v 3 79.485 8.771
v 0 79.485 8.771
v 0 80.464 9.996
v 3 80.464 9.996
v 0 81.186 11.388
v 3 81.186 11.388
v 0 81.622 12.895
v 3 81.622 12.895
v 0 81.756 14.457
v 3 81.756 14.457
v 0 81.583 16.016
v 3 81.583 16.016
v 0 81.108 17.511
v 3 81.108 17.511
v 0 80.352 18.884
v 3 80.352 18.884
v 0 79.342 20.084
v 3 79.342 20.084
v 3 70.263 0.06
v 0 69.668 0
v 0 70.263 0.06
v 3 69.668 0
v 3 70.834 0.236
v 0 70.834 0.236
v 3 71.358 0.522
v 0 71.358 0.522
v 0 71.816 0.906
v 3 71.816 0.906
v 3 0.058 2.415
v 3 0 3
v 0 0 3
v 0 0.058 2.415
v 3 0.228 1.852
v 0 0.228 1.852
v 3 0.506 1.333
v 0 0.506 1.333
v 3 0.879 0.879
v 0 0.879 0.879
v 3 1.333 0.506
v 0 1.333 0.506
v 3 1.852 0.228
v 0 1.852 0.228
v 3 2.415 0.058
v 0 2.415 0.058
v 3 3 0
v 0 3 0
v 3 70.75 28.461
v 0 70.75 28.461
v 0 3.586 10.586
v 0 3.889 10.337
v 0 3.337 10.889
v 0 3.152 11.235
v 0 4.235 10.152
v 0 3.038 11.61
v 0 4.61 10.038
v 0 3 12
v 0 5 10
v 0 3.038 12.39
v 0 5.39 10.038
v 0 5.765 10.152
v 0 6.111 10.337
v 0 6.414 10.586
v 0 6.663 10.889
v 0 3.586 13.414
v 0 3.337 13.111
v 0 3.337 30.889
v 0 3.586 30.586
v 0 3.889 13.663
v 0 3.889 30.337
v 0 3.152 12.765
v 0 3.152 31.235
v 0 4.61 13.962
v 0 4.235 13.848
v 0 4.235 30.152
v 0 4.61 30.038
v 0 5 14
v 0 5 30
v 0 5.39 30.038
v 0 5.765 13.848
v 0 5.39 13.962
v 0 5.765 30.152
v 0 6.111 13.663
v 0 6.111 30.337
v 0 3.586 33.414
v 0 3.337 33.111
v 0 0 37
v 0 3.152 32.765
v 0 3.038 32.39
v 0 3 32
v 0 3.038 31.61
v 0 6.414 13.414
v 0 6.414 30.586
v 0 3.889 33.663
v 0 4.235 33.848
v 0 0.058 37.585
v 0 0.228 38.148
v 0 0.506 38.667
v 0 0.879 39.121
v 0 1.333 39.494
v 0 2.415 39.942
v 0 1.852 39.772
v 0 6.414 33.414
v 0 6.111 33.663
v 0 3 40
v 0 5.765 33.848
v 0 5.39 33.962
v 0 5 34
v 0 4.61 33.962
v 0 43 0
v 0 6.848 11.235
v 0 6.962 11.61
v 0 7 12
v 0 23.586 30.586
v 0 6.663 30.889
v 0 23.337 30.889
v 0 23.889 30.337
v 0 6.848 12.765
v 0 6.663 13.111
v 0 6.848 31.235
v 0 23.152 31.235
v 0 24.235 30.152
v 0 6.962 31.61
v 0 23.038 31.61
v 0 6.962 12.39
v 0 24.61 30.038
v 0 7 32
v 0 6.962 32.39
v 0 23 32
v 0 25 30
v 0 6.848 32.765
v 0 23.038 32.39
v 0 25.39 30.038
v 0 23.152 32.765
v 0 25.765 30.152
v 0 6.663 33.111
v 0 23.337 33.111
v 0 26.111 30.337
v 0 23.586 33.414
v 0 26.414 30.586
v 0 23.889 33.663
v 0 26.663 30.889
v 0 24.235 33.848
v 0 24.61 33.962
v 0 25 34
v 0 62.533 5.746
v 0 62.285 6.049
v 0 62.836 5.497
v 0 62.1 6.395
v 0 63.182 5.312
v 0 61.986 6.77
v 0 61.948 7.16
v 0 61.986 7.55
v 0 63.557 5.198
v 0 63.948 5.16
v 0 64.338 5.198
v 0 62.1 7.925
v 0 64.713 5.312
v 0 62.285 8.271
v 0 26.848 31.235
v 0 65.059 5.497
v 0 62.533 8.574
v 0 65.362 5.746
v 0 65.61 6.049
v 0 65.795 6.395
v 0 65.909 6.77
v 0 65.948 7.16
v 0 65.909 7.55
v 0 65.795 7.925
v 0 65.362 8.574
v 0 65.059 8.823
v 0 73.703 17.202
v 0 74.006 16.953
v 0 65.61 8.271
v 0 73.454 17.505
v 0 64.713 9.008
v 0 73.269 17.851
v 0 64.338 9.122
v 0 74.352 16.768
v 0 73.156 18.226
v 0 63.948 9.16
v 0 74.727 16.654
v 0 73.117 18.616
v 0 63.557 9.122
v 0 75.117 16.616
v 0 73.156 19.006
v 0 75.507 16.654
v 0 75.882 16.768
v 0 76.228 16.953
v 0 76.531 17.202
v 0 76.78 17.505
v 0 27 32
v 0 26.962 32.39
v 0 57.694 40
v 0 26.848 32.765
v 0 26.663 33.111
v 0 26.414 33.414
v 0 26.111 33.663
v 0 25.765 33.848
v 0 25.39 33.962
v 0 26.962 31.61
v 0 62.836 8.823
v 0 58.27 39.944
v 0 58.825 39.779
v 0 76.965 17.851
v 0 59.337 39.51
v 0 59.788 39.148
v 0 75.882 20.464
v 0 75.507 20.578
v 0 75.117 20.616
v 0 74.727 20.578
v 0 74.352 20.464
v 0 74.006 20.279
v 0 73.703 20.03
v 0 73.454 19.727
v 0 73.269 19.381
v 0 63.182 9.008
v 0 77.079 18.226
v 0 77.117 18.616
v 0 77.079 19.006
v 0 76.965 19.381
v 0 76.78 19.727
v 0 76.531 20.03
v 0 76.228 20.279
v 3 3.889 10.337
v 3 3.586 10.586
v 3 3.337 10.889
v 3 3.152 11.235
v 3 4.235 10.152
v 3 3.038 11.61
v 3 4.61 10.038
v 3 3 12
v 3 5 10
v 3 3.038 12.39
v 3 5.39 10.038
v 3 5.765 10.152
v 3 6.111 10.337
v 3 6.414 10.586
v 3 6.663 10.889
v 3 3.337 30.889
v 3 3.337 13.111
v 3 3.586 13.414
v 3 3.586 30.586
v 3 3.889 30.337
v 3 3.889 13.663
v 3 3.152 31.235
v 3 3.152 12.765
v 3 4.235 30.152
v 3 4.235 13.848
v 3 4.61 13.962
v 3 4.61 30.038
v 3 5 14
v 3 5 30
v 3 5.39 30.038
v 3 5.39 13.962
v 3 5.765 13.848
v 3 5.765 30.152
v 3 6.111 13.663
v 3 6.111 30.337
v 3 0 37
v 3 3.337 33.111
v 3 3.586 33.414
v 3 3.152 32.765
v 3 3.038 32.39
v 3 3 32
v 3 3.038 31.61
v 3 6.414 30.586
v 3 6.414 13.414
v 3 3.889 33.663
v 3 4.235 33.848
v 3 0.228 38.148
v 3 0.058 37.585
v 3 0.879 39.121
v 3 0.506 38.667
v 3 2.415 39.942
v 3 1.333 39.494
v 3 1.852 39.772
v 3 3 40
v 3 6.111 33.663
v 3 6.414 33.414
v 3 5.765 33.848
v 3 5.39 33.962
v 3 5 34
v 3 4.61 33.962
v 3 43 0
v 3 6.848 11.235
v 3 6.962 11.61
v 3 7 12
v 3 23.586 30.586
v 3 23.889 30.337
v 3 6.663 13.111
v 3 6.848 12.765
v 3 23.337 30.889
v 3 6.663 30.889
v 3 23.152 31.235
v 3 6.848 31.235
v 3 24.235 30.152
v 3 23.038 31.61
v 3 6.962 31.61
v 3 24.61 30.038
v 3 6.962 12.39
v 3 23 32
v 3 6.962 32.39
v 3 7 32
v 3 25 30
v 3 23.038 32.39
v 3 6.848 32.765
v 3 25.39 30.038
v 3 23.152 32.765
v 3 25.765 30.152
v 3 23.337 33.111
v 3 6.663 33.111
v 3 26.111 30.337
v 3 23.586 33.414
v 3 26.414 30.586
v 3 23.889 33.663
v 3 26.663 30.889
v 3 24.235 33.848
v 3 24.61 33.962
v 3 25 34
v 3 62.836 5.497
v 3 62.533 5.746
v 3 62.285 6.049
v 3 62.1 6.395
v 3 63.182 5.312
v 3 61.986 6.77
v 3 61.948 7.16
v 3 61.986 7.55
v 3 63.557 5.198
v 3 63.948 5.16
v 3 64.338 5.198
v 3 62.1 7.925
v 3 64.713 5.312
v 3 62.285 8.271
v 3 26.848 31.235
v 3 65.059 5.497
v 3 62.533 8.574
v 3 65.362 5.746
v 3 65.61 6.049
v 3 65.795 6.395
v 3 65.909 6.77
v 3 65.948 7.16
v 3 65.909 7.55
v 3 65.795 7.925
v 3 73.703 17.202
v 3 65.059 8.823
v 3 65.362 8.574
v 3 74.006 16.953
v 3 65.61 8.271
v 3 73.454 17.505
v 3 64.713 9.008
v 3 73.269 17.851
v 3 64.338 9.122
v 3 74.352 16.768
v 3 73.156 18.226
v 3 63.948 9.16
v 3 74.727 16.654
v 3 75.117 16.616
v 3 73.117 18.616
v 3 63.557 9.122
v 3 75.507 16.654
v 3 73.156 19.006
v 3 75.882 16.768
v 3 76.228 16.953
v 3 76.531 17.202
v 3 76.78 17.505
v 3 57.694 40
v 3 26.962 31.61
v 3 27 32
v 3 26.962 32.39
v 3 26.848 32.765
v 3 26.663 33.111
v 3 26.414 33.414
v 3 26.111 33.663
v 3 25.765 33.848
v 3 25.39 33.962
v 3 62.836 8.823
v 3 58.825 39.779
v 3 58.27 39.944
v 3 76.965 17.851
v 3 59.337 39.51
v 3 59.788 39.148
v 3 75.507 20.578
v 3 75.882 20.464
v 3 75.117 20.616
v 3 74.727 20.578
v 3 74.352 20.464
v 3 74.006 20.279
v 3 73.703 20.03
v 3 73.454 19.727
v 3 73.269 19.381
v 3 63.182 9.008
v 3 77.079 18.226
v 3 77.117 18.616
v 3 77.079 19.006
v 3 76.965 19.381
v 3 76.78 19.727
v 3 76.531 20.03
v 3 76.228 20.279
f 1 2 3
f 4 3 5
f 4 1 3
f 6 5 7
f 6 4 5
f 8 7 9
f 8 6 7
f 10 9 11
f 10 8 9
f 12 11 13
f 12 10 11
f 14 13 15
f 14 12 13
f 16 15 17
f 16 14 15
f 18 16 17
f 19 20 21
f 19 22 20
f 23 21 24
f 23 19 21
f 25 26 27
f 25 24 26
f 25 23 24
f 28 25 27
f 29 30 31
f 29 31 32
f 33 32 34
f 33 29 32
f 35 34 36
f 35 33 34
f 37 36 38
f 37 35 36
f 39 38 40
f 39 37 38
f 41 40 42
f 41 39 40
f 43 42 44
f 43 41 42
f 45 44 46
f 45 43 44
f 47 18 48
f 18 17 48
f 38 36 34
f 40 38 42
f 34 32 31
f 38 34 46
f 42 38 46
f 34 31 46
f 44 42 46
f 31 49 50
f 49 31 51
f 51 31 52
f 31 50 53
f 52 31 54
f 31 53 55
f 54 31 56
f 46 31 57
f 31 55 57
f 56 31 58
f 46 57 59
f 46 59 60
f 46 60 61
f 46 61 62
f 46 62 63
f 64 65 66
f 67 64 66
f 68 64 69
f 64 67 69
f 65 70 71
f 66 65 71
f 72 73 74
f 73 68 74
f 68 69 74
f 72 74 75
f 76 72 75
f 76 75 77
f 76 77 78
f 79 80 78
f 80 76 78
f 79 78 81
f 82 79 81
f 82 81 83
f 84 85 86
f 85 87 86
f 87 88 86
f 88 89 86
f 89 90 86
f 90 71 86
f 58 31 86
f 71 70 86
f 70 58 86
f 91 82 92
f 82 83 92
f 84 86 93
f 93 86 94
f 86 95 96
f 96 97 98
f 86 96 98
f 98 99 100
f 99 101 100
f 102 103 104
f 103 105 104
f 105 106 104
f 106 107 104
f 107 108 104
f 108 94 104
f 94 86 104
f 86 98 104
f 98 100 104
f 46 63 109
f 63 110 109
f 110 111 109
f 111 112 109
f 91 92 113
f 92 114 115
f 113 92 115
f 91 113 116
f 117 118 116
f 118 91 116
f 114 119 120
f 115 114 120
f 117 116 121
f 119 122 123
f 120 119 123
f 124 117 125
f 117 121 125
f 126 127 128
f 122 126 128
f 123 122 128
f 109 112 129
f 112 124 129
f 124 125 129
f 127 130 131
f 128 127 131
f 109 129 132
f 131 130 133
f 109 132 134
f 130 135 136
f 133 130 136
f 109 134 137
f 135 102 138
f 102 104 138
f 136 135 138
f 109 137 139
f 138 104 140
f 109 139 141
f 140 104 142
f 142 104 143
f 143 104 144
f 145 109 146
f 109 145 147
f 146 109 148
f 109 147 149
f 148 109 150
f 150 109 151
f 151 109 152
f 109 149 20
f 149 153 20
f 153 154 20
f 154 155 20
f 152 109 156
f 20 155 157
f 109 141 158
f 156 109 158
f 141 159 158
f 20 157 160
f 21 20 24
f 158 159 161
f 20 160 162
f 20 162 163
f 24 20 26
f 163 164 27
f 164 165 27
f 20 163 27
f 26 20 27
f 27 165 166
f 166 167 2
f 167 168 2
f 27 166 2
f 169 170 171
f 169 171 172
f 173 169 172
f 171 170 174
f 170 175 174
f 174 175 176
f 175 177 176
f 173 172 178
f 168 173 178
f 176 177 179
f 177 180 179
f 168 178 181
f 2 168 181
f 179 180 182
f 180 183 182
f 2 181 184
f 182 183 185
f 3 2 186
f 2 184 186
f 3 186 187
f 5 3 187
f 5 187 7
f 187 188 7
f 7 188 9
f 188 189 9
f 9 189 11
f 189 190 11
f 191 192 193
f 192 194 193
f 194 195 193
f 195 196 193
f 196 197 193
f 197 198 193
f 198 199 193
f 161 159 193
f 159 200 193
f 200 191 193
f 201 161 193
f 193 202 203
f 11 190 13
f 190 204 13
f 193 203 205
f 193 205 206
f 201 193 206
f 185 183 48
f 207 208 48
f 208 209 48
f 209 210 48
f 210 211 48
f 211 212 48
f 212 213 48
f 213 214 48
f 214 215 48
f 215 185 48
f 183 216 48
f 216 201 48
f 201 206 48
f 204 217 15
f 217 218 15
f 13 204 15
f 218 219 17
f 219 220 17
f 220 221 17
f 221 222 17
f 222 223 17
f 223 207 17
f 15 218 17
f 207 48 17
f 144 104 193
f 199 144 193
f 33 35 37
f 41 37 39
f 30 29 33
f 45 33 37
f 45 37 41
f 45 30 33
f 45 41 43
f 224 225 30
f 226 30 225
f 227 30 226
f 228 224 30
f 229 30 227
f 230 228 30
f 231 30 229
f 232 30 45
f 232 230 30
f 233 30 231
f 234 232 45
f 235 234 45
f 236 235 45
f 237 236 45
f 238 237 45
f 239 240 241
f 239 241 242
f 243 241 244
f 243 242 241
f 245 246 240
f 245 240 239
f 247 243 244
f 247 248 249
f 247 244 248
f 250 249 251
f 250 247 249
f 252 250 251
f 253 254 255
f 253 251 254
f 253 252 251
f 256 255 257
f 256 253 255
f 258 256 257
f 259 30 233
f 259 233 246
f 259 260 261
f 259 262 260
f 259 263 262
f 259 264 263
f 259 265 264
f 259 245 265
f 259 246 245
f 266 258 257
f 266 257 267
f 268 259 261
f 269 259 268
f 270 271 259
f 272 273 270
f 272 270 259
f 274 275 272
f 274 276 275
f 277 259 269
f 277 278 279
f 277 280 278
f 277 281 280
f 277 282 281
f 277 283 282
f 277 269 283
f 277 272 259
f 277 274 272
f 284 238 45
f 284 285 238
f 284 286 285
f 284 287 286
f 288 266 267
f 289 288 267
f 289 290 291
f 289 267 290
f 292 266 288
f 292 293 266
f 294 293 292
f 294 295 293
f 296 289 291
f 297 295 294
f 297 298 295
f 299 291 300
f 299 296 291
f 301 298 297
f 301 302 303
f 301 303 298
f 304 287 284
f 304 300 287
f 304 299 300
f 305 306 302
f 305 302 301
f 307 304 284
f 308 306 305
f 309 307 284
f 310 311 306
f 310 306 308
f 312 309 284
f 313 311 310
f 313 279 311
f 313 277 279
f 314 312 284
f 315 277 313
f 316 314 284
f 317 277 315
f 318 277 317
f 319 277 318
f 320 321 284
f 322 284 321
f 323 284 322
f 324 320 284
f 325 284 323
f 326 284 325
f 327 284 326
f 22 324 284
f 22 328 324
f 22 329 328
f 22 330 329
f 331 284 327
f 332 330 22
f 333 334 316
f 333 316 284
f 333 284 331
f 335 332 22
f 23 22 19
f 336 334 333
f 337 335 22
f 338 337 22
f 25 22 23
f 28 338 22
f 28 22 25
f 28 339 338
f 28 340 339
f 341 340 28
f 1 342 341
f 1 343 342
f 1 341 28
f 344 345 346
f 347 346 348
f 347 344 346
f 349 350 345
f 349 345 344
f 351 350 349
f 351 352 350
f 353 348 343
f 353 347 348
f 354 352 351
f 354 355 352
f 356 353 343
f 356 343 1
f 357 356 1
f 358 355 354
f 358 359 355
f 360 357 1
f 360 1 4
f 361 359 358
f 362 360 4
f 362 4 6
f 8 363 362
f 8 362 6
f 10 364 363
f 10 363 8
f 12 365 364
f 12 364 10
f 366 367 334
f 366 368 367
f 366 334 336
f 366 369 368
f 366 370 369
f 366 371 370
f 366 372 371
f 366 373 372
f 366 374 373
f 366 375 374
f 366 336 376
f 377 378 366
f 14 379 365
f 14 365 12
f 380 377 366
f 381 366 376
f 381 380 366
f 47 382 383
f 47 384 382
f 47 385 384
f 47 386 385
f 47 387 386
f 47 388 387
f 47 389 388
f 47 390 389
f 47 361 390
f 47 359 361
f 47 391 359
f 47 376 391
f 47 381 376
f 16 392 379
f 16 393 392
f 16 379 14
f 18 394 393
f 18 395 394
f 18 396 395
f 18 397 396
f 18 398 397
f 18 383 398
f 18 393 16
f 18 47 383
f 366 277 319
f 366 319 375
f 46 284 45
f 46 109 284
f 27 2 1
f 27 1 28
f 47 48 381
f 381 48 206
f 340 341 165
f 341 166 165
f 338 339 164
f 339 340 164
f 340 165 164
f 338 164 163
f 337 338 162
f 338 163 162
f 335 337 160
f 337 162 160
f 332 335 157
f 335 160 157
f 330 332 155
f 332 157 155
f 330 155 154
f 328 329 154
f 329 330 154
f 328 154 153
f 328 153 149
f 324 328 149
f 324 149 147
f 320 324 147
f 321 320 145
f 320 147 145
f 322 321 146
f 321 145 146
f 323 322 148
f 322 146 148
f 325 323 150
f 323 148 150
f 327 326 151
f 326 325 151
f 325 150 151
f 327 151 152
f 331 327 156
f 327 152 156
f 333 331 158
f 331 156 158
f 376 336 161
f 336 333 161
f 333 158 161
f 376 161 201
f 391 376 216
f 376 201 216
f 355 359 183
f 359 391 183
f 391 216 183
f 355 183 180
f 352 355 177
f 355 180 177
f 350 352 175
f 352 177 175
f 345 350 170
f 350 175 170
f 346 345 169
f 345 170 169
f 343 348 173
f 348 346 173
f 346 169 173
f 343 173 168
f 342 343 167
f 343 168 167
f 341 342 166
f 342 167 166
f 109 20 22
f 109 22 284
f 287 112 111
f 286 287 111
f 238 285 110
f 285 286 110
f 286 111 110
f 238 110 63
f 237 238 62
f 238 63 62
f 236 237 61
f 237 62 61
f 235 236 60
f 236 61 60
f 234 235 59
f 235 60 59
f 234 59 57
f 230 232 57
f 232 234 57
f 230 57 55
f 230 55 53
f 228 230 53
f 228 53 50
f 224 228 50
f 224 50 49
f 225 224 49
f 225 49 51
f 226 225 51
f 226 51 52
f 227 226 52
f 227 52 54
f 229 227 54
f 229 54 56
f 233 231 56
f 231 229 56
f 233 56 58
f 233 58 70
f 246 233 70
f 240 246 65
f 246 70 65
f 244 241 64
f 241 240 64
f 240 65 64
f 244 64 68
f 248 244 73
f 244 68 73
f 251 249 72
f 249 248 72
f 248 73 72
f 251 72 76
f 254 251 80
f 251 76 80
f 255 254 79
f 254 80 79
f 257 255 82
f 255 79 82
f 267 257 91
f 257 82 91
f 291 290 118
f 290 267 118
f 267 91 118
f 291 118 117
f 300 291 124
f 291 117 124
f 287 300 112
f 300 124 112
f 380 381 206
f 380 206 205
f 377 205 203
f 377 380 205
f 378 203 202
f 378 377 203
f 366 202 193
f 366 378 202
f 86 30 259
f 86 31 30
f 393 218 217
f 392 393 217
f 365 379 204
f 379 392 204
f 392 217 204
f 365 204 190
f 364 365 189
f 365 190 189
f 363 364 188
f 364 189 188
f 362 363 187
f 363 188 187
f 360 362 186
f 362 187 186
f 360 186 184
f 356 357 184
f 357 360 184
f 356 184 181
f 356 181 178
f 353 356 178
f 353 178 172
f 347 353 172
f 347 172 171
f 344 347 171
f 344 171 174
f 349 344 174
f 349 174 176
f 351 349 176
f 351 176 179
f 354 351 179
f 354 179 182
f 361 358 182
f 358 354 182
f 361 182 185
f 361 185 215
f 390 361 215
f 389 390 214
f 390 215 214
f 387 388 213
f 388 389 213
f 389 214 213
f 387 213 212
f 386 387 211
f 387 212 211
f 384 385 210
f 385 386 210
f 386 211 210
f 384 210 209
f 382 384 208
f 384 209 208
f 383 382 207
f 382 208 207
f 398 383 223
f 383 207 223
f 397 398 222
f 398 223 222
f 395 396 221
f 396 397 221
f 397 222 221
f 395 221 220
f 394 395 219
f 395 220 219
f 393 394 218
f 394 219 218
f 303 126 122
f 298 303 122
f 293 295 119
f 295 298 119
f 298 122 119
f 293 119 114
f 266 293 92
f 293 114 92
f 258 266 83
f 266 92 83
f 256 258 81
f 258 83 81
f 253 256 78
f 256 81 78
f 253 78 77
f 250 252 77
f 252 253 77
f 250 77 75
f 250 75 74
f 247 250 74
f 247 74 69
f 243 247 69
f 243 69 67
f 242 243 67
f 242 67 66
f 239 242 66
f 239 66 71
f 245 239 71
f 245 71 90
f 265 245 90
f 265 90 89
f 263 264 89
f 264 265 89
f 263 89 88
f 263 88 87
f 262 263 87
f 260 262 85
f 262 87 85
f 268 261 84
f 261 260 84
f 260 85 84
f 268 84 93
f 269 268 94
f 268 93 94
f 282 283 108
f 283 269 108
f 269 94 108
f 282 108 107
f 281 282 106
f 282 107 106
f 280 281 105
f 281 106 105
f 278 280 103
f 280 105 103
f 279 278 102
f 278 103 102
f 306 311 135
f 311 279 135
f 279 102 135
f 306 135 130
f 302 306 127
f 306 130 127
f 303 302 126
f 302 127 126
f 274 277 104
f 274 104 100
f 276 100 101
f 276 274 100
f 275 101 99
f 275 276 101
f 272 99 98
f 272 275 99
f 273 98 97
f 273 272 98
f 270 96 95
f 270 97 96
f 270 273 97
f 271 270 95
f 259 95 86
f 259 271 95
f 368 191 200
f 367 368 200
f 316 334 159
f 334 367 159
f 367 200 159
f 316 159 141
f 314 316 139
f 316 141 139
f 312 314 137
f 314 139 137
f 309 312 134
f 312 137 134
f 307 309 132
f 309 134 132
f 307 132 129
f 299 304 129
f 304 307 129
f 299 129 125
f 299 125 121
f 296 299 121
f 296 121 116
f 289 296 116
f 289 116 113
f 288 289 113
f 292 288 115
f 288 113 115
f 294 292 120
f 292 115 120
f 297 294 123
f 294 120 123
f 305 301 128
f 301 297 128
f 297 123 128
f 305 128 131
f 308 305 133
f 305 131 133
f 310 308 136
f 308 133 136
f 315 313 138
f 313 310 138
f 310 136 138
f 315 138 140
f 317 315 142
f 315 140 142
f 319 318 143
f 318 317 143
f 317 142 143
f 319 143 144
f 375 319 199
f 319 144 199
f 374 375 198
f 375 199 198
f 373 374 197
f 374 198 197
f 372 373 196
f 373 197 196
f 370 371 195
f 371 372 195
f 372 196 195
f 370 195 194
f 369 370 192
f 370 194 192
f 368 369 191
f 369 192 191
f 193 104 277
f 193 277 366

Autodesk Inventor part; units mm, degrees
ref_plane "YZ Plane" through (0, 0, 0) normal (1, 0, 0) x (0, 1, 0)
ref_plane "XZ Plane" through (0, 0, 0) normal (0, 1, 0) x (-1, 0, 0)
ref_plane "XY Plane" through (0, 0, 0) normal (0, 0, 1) x (1, 0, 0)
sketch "Sketch1" plane through (0, 0, 0) normal (1, 0, 0) x (0, 1, 0)
  line L0 (0, 0) -> (0, 40)
  line L1 (0, 40) -> (82, 40) construction
  line L2 (82, 40) -> (43, 0) construction
  line L3 (43, 0) -> (0, 0)
  line L4 (85.0695, 14.499) -> (70.933, 0)
  line L5 (70.933, 0) -> (43, 0)
  line L6 (85.0695, 14.499) -> (70.7495, 28.461)
  circle A0 centre (75.1171, 18.616) radius 2
  circle A1 centre (63.9475, 7.16) radius 2
  line L7 (77.9095, 21.48) -> (56.9665, 0) construction
  circle A2 centre (25, 32) radius 2
  circle A3 centre (5, 32) radius 2
  circle A4 centre (5, 12) radius 2
  line L8 (25, 32) -> (5, 32) construction
  line L9 (5, 32) -> (5, 12) construction
  line L10 (70.7495, 28.461) -> (58.9146, 40)
  line L11 (0, 40) -> (58.9146, 40)
  dimension "d0" = 43
  dimension "d1" = 39
  dimension "d2" = 40
  dimension "d4" = 4
  dimension "d5" = 16
  dimension "d6" = 4
  dimension "d7" = 4
  dimension "d8" = 20
  dimension "d9" = 20
  dimension "d10" = 8
  dimension "d11" = 5
  dimension "d16" = 20
  dimension "d17" = 10
extrude "Extrusion1" add sketch "Sketch1" along normal blind 3
fillet "Fillet1" radius 3 4 edges at (1.5, 58.9146, 40) (1.5, 70.933, 0) (1.5, 0, 40) (1.5, 0, 0)
fillet "Fillet2" radius 8 1 edges at (1.5, 85.0695, 14.499)
properties part number "Arm_Servo_Holder"
